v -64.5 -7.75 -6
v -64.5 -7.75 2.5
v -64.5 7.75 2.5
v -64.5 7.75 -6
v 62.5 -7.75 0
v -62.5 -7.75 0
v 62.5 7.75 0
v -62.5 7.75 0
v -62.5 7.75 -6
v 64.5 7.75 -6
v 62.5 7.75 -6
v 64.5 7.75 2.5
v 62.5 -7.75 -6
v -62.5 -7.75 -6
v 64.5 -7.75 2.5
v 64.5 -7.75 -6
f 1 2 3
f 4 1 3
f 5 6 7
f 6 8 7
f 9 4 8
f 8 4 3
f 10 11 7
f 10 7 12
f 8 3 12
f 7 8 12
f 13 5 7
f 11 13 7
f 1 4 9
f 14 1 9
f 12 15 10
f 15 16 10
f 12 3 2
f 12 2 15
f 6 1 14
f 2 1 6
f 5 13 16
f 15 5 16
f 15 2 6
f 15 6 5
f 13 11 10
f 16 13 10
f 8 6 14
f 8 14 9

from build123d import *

# Parameters (mm, degrees)
F0_W     = 2
F0_H     = 15.5
F0_W_2   = 125
F1_DEPTH = 2.5
F2_DEPTH = 6


with BuildPart() as f1:
    # F0 (on Top) → F1 (new body)
    with BuildSketch(Plane.XY):
        with Locations((63.5, 0)):
            Rectangle(F0_W, F0_H)
        Rectangle(F0_W_2, F0_H)
        with Locations((-63.5, 0)):
            Rectangle(F0_W, F0_H)
    extrude(amount=F1_DEPTH)

    # F0 (on Top) → F2 (join)
    with BuildSketch(Plane.XY):
        with Locations((-63.5, 0)):
            Rectangle(F0_W, F0_H)
        with Locations((63.5, 0)):
            Rectangle(F0_W, F0_H)
    extrude(amount=-F2_DEPTH)


solid = f1.part
